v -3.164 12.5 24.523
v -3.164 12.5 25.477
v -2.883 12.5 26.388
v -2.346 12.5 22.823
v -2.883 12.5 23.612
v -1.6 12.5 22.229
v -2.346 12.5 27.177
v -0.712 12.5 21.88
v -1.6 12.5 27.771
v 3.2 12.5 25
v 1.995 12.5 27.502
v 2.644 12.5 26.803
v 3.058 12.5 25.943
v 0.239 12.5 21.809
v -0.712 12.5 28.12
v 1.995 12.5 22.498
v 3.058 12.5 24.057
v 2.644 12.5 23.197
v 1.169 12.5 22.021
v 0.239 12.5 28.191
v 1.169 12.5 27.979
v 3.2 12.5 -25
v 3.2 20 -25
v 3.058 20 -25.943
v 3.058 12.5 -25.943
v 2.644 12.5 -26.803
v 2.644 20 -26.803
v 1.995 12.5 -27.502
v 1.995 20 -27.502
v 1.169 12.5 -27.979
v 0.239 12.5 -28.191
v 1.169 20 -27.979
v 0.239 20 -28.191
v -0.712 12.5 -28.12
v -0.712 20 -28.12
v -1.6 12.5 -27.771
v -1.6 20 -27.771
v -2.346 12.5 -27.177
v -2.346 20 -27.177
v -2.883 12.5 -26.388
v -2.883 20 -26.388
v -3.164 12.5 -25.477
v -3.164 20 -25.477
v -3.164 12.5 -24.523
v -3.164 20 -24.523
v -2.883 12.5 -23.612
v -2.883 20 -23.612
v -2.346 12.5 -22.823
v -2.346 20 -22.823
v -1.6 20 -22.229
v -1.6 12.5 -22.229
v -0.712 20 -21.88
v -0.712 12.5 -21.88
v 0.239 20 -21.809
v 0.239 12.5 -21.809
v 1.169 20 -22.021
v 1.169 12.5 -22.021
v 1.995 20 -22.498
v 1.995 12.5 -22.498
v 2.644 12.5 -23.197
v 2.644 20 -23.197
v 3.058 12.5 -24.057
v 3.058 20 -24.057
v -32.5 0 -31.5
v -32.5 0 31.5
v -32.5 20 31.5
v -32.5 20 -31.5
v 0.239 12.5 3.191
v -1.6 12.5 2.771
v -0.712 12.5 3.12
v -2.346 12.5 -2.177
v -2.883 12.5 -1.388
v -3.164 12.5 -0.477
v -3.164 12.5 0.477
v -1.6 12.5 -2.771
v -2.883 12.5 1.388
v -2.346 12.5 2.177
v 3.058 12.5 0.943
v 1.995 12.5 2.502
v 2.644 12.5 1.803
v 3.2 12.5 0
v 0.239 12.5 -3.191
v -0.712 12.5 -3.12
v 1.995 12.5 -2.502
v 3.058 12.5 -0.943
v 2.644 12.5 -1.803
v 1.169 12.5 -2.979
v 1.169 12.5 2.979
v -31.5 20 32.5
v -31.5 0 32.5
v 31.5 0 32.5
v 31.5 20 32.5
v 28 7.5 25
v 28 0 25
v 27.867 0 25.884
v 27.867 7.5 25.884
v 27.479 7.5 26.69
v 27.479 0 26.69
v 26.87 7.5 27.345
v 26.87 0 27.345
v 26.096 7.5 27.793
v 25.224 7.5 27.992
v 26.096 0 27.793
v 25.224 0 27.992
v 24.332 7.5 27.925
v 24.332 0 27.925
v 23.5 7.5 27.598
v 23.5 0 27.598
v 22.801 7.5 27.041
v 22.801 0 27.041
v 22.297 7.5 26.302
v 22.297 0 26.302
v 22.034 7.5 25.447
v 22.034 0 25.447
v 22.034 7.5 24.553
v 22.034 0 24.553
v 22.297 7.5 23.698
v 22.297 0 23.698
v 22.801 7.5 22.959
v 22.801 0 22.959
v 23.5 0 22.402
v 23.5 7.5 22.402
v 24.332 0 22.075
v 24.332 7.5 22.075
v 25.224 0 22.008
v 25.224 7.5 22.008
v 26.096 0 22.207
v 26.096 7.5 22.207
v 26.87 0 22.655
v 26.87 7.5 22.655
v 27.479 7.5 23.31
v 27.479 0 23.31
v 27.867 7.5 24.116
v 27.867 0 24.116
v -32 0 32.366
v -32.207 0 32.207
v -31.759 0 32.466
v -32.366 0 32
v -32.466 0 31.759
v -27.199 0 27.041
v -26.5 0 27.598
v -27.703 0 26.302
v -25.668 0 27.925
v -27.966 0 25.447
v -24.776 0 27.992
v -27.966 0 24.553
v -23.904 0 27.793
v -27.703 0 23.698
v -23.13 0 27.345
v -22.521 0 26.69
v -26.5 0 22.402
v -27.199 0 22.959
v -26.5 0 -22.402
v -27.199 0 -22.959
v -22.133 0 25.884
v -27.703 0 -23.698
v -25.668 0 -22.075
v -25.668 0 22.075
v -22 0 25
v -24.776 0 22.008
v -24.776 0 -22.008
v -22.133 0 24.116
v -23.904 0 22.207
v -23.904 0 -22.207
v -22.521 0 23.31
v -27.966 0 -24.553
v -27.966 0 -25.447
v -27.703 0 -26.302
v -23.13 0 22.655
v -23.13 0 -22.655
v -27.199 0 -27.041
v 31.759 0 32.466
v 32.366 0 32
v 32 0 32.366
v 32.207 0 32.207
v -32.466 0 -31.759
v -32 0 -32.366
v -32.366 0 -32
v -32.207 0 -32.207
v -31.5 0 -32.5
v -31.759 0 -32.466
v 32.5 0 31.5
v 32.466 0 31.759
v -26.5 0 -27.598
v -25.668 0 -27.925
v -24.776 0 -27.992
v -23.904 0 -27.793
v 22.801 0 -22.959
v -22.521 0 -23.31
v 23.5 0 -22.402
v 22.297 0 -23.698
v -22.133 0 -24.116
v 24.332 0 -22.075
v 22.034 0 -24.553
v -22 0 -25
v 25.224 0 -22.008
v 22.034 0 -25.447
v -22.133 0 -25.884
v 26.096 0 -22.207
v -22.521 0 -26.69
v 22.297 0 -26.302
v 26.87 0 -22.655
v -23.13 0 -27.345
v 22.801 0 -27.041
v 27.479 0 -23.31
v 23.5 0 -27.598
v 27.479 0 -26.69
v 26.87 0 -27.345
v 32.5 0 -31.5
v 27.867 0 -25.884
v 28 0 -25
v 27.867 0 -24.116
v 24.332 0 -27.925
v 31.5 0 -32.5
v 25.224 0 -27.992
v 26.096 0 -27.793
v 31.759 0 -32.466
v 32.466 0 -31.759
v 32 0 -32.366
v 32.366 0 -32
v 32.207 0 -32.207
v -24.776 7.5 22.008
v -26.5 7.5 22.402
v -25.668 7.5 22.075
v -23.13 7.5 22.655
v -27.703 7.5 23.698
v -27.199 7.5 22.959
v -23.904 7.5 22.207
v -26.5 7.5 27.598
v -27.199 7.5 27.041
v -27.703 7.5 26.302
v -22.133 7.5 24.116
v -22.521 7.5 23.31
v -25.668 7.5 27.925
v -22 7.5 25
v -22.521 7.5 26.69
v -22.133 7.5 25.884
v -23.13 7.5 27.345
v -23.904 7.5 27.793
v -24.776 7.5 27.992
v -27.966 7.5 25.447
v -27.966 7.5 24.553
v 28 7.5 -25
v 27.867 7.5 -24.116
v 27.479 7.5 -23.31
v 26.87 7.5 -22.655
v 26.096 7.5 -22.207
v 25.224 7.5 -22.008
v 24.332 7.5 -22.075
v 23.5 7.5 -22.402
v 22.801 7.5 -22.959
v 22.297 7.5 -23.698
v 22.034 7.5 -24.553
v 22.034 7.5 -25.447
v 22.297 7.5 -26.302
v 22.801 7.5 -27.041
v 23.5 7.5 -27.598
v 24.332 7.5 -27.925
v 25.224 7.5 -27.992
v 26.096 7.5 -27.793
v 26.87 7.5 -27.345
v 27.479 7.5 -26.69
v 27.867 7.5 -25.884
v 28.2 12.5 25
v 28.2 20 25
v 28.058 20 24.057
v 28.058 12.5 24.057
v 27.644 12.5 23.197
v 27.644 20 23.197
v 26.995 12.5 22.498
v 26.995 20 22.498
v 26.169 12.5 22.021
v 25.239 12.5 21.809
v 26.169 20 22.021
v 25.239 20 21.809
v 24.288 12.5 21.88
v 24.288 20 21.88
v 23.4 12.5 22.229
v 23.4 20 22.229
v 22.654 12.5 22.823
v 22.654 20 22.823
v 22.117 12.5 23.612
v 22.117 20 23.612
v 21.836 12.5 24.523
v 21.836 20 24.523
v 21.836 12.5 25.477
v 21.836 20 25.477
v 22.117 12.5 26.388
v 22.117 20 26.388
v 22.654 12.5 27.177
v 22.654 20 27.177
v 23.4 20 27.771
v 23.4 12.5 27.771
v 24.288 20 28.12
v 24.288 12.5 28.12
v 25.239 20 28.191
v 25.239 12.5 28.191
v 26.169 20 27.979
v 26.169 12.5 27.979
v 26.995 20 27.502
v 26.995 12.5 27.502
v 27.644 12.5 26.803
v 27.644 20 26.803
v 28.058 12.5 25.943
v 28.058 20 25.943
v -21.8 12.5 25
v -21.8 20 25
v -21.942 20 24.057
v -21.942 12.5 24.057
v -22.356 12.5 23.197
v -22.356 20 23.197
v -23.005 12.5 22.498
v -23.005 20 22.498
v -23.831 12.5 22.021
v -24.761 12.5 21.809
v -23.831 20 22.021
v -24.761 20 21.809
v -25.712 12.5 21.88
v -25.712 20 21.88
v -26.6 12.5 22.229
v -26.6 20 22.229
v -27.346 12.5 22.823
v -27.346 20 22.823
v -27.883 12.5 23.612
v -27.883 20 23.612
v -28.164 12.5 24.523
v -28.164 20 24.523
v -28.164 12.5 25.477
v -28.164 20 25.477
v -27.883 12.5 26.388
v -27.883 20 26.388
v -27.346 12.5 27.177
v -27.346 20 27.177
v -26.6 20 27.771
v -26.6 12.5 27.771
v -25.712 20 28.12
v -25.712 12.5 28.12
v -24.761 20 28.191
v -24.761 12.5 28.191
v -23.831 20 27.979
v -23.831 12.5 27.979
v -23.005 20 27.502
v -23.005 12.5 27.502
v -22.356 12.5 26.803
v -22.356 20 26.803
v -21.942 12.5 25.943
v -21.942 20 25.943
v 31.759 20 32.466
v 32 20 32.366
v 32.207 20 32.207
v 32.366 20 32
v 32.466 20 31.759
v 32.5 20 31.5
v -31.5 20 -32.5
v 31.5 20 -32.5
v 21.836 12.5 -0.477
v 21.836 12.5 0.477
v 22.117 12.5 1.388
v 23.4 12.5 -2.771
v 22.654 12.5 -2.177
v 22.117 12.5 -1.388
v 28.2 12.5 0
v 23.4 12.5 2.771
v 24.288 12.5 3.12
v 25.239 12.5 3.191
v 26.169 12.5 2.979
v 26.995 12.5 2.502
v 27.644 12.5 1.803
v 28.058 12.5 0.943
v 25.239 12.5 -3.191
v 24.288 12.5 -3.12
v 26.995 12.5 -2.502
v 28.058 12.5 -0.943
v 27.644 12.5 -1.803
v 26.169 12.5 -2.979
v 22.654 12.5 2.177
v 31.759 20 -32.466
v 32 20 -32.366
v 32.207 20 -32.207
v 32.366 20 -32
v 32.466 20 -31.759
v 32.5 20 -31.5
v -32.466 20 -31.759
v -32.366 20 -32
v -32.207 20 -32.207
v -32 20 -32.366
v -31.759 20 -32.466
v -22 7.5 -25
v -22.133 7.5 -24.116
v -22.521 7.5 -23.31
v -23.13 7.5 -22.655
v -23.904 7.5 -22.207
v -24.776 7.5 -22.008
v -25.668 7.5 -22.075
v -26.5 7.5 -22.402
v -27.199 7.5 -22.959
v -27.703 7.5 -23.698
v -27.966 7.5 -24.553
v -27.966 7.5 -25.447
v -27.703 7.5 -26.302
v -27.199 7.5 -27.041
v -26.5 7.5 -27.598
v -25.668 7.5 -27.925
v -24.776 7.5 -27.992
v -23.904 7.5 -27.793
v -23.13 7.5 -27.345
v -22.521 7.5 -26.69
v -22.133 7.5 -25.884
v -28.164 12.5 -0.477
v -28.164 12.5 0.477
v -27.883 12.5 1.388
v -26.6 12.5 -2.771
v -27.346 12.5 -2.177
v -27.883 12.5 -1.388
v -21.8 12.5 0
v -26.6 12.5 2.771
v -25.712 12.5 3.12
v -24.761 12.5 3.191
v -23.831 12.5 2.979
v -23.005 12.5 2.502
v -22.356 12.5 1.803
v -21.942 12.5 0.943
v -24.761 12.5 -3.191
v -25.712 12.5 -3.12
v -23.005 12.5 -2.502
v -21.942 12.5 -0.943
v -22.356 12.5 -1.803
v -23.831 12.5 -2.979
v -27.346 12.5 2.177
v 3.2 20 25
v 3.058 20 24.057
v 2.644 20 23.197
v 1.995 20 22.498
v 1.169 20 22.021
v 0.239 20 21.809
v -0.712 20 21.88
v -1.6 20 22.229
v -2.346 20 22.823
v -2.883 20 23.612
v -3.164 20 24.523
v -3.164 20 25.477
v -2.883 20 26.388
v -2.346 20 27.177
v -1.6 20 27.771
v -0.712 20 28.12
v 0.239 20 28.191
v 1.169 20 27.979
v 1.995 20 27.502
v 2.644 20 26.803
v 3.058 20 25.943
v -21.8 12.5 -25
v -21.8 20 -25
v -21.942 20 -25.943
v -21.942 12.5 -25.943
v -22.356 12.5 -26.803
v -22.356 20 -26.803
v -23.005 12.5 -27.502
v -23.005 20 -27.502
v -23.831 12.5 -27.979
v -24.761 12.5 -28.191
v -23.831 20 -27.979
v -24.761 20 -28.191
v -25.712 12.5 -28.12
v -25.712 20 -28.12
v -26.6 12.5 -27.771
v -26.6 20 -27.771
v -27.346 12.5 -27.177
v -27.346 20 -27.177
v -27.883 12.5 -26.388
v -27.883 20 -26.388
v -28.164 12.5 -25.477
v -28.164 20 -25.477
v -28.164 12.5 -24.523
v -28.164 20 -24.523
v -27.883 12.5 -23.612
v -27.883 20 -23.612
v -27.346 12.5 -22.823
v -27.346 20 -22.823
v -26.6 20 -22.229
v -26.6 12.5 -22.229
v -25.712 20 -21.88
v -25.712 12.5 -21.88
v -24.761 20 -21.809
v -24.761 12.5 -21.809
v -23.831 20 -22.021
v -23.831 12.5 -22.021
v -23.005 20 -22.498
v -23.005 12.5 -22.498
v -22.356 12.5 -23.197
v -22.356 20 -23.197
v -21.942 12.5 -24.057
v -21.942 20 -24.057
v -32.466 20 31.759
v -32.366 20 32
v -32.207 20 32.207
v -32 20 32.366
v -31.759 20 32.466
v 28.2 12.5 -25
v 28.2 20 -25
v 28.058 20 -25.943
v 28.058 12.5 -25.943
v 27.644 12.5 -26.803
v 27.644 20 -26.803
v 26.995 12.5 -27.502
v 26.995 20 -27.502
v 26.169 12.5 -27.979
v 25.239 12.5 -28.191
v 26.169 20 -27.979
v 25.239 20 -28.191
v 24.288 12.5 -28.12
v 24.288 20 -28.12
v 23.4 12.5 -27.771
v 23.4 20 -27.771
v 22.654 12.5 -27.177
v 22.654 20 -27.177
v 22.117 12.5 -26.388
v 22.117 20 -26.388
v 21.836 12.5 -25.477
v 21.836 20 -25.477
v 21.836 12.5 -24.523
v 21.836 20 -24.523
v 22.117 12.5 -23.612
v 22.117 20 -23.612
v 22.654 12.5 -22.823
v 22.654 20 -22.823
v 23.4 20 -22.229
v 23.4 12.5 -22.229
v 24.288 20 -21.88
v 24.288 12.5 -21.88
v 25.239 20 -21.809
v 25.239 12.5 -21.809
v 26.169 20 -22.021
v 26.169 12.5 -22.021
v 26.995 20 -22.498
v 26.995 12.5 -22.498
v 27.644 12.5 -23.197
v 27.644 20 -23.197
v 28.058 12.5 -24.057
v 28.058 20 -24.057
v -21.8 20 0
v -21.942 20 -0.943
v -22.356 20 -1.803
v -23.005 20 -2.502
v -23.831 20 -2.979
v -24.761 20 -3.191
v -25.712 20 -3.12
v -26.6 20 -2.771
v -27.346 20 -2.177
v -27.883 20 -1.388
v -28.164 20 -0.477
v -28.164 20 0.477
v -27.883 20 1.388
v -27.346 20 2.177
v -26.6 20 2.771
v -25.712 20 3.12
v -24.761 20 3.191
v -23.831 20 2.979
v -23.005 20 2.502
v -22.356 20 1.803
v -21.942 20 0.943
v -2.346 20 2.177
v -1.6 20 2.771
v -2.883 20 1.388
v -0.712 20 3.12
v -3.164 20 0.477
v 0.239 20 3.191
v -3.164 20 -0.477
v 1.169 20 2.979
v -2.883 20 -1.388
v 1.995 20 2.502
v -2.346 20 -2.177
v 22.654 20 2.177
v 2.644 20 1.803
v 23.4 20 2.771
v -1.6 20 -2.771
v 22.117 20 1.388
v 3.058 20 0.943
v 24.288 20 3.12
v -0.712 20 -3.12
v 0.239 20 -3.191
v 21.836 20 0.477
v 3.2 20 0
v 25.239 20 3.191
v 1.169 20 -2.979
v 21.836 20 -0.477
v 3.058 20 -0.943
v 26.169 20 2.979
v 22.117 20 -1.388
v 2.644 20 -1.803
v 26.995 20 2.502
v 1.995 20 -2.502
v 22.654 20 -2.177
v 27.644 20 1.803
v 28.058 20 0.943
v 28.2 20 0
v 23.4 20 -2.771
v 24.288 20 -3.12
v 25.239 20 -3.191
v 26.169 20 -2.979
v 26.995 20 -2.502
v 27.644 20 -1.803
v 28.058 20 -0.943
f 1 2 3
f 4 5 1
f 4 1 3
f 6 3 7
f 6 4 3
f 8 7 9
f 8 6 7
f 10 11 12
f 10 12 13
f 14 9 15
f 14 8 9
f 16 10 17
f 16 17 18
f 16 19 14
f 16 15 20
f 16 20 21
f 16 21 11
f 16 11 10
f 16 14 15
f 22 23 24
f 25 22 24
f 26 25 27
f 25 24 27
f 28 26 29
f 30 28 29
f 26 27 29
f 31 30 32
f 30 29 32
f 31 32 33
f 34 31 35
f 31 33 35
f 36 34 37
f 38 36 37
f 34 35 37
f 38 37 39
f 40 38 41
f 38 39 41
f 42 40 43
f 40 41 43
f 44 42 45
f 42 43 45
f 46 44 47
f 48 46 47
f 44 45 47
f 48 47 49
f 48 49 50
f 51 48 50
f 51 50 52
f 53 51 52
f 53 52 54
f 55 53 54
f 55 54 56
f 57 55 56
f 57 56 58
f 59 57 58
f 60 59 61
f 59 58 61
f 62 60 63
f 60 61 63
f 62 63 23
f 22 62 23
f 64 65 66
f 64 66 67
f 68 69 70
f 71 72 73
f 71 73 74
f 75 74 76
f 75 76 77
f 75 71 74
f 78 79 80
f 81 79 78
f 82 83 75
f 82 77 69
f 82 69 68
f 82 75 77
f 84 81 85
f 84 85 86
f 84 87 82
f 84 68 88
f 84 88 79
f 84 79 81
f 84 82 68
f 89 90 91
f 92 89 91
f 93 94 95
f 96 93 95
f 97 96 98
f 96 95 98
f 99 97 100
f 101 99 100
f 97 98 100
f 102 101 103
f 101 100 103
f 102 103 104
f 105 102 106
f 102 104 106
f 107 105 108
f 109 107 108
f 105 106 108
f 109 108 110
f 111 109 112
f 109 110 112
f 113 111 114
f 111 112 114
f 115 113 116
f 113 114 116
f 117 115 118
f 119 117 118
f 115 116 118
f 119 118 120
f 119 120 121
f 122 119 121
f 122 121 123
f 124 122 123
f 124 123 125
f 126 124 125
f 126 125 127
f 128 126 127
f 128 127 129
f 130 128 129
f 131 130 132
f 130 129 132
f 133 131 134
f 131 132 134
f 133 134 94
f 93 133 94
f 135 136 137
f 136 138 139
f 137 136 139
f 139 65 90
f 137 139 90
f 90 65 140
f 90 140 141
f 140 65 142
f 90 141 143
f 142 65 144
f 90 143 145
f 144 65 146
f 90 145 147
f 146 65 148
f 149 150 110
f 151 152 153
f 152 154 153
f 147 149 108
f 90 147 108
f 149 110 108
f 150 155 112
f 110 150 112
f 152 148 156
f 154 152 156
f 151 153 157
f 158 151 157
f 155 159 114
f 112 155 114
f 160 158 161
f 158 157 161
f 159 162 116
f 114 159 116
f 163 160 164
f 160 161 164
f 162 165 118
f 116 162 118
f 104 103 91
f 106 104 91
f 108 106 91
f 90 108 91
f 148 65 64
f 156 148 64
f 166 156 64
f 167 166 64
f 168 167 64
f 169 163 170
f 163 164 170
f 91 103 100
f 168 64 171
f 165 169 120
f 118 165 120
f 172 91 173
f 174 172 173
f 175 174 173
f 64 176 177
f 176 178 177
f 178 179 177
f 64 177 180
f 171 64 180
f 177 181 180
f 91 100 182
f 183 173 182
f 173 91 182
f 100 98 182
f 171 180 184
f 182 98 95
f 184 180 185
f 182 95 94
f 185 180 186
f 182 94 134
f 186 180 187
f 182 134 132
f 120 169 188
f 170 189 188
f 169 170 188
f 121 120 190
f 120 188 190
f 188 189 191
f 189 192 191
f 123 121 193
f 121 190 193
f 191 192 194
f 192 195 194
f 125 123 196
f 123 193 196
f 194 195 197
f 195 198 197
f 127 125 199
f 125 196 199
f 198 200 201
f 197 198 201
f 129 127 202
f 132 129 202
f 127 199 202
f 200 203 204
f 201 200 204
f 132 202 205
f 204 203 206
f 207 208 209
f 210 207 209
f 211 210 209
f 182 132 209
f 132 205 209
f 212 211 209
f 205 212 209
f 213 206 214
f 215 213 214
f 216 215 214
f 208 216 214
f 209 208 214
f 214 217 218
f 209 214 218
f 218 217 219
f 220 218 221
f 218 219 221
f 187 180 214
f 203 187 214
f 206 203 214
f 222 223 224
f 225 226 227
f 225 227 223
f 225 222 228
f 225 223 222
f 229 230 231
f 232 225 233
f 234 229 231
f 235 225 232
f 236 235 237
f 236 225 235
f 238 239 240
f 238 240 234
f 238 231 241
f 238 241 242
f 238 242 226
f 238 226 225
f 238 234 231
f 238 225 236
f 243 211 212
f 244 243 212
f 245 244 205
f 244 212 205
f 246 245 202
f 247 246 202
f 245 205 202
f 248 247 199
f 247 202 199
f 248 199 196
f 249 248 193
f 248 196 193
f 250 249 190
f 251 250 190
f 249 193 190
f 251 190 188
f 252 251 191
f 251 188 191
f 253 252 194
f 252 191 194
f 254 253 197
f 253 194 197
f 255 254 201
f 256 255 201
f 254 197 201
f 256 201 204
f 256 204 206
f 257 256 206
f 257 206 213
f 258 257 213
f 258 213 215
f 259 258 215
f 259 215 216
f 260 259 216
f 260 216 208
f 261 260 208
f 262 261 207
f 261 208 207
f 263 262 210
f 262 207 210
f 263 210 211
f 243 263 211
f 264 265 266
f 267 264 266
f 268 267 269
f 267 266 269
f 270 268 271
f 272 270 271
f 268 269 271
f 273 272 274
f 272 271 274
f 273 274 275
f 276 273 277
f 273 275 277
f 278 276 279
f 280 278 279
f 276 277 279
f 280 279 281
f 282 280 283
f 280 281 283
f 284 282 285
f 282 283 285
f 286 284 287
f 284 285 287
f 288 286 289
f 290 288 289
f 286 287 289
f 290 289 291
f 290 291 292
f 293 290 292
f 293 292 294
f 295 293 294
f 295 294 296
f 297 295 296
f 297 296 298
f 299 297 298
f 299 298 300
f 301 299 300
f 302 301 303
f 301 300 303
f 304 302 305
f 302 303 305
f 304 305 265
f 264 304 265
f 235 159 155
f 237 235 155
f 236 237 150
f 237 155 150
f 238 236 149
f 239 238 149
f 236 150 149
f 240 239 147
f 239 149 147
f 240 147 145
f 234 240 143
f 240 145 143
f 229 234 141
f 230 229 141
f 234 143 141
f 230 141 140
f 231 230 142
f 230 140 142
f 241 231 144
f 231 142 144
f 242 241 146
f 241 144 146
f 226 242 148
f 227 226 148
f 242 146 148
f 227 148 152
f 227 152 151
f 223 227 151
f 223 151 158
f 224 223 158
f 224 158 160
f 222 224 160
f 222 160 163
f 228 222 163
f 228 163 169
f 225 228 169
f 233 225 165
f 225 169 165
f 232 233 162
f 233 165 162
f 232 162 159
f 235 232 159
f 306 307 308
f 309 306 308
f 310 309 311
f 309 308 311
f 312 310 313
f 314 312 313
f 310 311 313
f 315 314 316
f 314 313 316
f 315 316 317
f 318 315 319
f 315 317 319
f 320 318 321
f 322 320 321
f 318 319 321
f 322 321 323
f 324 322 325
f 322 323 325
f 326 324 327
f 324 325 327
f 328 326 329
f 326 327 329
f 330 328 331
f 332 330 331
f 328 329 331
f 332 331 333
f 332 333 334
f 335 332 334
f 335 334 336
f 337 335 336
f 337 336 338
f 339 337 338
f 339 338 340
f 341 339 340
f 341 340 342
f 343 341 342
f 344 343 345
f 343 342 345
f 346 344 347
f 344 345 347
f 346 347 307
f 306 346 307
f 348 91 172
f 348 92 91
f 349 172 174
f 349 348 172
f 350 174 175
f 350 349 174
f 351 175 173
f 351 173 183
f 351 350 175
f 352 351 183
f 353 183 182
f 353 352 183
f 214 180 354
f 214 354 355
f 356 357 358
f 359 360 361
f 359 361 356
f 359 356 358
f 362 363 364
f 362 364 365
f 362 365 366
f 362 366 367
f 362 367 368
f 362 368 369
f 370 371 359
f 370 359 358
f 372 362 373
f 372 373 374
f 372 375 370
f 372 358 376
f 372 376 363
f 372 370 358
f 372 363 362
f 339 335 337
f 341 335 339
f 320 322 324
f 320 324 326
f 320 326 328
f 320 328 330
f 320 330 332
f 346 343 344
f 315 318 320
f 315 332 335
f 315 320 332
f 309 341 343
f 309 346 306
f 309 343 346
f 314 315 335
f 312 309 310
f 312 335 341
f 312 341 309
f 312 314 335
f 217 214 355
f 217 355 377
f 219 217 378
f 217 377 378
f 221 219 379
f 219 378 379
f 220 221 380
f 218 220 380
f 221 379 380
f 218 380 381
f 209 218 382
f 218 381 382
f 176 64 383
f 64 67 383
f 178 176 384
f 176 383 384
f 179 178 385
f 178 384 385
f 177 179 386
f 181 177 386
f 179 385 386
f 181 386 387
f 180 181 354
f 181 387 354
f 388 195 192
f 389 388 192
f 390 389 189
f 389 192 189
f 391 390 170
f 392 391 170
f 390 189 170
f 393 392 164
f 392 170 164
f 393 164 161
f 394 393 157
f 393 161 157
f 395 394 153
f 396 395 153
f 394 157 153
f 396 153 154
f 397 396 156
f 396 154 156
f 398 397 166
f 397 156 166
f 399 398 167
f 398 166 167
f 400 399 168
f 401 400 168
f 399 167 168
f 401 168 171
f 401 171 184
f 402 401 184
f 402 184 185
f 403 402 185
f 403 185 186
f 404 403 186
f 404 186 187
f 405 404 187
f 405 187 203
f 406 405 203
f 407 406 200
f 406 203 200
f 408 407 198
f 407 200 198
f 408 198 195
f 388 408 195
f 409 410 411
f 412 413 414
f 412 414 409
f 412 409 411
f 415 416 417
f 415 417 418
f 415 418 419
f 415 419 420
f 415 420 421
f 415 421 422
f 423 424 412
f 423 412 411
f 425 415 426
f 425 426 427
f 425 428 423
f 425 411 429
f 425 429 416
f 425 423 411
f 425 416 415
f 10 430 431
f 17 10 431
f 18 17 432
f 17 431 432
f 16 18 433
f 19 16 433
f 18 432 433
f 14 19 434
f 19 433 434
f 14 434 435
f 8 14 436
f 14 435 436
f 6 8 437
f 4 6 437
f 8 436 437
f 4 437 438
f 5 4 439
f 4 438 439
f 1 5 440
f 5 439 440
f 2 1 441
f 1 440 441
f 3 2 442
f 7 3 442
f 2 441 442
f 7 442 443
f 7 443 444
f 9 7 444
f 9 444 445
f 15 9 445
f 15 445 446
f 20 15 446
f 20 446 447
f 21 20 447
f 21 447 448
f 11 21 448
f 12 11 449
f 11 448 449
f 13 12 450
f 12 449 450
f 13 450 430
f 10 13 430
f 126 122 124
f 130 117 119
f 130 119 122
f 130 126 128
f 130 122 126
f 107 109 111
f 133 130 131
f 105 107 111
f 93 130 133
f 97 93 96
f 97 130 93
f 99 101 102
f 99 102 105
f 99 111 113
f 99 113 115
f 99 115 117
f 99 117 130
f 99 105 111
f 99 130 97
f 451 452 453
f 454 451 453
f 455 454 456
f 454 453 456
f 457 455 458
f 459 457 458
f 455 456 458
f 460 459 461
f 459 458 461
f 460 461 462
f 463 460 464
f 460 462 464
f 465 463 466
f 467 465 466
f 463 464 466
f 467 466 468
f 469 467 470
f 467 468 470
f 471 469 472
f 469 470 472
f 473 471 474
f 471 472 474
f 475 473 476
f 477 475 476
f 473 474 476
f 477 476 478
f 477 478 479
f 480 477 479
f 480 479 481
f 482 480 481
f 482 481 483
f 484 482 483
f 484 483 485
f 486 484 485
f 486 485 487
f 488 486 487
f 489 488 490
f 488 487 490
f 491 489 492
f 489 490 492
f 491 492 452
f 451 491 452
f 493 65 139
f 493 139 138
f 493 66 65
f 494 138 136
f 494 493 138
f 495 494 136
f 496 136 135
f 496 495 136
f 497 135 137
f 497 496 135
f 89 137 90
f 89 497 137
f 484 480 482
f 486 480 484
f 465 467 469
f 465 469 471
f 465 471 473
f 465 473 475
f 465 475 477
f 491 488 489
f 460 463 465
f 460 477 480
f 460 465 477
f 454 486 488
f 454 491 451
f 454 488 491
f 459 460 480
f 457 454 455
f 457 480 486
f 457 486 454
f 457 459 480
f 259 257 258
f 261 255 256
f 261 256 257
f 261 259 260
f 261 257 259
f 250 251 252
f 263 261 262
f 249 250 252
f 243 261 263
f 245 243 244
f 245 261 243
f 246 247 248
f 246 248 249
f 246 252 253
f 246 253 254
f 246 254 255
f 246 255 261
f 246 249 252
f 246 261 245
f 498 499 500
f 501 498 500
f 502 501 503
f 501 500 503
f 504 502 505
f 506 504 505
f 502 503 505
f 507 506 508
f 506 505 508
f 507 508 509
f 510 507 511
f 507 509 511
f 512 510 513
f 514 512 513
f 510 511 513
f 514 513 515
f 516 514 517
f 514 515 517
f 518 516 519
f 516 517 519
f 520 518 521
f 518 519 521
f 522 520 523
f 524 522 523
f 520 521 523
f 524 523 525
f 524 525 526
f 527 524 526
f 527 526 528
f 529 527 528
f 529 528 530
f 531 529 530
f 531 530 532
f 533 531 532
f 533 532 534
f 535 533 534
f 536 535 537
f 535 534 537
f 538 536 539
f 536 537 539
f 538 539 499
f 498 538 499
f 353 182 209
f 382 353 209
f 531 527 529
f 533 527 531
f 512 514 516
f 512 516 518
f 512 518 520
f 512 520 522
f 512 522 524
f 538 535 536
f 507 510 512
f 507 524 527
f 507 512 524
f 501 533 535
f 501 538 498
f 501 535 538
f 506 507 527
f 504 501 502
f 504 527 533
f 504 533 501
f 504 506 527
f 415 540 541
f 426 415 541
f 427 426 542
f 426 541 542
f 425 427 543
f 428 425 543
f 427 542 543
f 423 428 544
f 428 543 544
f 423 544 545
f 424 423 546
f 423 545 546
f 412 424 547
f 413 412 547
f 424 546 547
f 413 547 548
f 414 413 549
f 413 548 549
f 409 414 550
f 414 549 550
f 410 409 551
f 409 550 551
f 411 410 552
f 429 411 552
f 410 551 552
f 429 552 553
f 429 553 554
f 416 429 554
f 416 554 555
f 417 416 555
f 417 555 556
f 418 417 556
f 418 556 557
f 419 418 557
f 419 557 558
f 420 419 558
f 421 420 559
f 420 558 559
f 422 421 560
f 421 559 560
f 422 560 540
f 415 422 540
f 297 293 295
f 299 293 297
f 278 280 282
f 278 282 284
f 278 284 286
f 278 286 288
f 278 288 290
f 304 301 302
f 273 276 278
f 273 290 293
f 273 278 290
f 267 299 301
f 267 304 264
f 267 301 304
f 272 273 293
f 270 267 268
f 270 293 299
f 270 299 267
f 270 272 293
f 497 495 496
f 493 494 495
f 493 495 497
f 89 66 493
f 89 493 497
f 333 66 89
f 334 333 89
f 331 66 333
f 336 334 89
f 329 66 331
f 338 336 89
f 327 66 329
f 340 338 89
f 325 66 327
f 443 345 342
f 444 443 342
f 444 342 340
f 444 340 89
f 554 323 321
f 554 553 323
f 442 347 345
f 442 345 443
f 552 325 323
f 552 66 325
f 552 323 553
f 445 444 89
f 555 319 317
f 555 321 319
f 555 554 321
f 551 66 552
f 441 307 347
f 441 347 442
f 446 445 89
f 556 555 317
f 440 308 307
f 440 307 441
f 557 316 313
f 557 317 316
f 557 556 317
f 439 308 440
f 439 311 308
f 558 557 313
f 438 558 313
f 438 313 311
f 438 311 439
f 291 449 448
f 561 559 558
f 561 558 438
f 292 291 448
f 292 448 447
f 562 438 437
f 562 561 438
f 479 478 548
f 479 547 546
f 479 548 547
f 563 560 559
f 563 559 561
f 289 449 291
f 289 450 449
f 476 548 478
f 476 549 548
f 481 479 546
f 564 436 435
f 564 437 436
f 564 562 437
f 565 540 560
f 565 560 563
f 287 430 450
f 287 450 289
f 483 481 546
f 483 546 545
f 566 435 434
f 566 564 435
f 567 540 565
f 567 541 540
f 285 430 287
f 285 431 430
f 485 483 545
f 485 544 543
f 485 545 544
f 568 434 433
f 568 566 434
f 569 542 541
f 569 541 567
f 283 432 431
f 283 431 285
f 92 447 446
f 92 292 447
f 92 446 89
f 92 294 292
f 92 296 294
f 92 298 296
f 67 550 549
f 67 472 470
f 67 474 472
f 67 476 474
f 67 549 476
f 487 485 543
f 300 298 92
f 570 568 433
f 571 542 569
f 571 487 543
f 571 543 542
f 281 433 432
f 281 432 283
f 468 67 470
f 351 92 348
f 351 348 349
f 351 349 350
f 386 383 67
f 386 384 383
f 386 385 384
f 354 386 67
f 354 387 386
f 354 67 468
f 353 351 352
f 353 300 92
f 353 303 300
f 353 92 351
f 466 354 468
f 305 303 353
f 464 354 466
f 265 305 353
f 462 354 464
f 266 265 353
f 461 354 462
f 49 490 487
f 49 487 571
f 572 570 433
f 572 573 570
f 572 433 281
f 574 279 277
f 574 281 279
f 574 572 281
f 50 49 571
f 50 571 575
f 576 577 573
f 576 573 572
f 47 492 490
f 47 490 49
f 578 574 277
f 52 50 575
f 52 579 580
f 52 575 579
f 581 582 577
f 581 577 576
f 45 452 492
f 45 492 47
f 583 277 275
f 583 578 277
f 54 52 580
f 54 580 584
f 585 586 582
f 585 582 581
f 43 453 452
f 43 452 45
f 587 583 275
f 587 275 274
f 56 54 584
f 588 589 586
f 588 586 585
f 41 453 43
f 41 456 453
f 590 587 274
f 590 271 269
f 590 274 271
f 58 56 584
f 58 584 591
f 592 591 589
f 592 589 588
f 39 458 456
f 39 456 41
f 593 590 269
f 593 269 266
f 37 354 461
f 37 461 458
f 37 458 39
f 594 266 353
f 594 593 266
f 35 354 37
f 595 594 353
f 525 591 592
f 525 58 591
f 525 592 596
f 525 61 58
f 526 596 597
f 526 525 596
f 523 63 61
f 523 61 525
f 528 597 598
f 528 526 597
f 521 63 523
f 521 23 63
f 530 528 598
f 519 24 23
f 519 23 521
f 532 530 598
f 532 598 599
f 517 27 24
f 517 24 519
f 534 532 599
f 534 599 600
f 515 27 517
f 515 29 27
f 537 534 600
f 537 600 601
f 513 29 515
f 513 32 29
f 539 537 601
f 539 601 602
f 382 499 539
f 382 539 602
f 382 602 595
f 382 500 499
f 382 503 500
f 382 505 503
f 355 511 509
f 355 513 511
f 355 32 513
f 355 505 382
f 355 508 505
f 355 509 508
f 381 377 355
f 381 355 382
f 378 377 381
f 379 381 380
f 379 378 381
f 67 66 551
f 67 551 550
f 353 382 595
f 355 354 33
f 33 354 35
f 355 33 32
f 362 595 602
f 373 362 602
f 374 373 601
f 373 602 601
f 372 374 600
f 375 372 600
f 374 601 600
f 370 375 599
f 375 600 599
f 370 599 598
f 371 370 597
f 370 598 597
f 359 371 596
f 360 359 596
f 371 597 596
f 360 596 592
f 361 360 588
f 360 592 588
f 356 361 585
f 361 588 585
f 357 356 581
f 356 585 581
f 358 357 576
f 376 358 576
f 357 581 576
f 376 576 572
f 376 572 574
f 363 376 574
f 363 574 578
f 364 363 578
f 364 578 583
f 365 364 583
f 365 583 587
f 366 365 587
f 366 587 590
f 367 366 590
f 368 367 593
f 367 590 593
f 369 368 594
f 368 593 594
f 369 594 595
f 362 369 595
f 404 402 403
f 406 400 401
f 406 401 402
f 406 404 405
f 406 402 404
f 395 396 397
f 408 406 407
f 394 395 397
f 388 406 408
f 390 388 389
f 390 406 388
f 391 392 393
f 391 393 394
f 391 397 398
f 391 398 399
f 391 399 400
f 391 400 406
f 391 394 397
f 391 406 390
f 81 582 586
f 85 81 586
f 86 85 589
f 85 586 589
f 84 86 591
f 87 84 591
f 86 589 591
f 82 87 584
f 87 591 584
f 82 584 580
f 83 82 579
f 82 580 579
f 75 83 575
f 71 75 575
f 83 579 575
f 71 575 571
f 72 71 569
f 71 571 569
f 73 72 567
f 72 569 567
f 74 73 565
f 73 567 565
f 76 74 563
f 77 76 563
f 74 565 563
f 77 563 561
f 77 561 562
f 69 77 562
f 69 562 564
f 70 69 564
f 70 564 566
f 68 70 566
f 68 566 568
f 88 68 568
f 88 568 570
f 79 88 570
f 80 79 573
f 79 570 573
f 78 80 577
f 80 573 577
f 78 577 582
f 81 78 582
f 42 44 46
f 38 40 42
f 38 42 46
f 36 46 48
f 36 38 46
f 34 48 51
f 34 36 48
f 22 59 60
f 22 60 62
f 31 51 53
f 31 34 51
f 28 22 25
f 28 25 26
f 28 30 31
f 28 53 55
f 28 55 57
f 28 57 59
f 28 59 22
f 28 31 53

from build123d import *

# Parameters (mm, degrees)
SKETCH_1_W          = 65
SKETCH_1_H          = 65
EXTRUDE_1_DEPTH     = 20
SKETCH_2_R          = 3
CUT_EXTRUDE_1_DEPTH = 7.5
SKETCH_3_R          = 3.2
CUT_EXTRUDE_2_DEPTH = 7.5
FILLET_1_R          = 1


with BuildPart() as part:
    # 스케치1 → 보스-돌출1 (new body)
    with BuildSketch(Plane(origin=(0, 0, 0), x_dir=(1, 0, 0), z_dir=(0, 1, 0))):
        Rectangle(SKETCH_1_W, SKETCH_1_H)
    extrude(amount=EXTRUDE_1_DEPTH)

    # 스케치2 → 컷-돌출1 (cut)
    with BuildSketch(Plane.XZ):
        with Locations((-25, 25)):
            Circle(SKETCH_2_R)
        with Locations((25, 25)):
            Circle(SKETCH_2_R)
        with Locations((25, -25)):
            Circle(SKETCH_2_R)
        with Locations((-25, -25)):
            Circle(SKETCH_2_R)
    extrude(amount=-CUT_EXTRUDE_1_DEPTH, mode=Mode.SUBTRACT)

    # 스케치3 → 컷-돌출2 (cut)
    with BuildSketch(Plane(origin=(0, 20, 0), x_dir=(1, 0, 0), z_dir=(0, 1, 0))):
        with Locations((-25, 25)):
            Circle(SKETCH_3_R)
        with Locations((0, 25)):
            Circle(SKETCH_3_R)
        with Locations((25, 25)):
            Circle(SKETCH_3_R)
        with Locations((25, 0)):
            Circle(SKETCH_3_R)
        with Locations((25, -25)):
            Circle(SKETCH_3_R)
        with Locations((0, -25)):
            Circle(SKETCH_3_R)
        with Locations((-25, -25)):
            Circle(SKETCH_3_R)
        with Locations((-25, 0)):
            Circle(SKETCH_3_R)
        Circle(SKETCH_3_R)
    extrude(amount=-CUT_EXTRUDE_2_DEPTH, mode=Mode.SUBTRACT)

    # 필렛1
    fillet_1_edges = [part.edges().sort_by_distance(p)[0] for p in [
        (-32.5, 10, -32.5),
        (32.5, 10, -32.5),
        (32.5, 10, 32.5),
        (-32.5, 10, 32.5),
    ]]
    fillet(fillet_1_edges, radius=FILLET_1_R)


solid = part.part
